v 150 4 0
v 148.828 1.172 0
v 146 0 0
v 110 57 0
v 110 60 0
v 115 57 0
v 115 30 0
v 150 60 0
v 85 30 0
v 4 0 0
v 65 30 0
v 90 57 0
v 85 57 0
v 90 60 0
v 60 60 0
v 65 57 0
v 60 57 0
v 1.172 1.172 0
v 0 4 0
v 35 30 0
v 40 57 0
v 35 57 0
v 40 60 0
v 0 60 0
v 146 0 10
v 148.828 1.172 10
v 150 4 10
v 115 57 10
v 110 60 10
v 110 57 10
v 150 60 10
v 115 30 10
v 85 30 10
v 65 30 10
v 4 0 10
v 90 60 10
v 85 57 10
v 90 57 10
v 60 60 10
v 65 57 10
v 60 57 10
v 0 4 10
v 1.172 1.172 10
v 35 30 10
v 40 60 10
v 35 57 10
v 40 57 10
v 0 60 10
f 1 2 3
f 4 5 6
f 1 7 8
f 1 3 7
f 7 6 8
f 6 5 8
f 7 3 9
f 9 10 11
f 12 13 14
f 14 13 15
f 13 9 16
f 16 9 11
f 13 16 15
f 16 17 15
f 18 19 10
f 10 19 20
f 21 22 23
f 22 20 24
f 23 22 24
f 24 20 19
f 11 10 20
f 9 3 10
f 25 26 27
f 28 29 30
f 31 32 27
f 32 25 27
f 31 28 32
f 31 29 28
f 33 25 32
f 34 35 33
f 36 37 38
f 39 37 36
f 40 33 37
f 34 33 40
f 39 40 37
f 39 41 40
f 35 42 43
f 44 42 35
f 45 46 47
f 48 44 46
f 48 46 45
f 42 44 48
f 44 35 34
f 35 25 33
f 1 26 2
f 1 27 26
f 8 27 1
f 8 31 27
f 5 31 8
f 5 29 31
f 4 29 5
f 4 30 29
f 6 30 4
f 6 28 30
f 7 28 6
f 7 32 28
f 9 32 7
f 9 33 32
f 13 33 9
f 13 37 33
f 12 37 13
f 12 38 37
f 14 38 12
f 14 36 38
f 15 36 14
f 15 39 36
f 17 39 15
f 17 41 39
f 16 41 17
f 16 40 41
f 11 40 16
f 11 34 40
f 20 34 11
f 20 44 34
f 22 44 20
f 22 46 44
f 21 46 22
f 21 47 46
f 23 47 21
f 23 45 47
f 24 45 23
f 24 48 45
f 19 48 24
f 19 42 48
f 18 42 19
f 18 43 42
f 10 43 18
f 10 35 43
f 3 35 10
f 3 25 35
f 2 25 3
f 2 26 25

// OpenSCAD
$fn = 32;

// ----------------------------------------------------------------------
// Oversize slot bar: 150 mm bar with 2 oversize windows
// ----------------------------------------------------------------------

// --- parameters (mm) ---
profile_height = 10;      // extrusion height
profile_points = 24;      // points of the closed outline

profile = [[0, 4], [1.172, 1.172], [4, 0], [146, 0], [148.828, 1.172], [150, 4], [150, 60], [110, 60], [110, 57], [115, 57], [115, 30], [85, 30], [85, 57], [90, 57], [90, 60], [60, 60], [60, 57], [65, 57], [65, 30], [35, 30], [35, 57], [40, 57], [40, 60], [0, 60]];  // single closed polygon, 24 points, counter clockwise

// --- the one profile operation ---
linear_extrude(height = profile_height) polygon(points = profile);
